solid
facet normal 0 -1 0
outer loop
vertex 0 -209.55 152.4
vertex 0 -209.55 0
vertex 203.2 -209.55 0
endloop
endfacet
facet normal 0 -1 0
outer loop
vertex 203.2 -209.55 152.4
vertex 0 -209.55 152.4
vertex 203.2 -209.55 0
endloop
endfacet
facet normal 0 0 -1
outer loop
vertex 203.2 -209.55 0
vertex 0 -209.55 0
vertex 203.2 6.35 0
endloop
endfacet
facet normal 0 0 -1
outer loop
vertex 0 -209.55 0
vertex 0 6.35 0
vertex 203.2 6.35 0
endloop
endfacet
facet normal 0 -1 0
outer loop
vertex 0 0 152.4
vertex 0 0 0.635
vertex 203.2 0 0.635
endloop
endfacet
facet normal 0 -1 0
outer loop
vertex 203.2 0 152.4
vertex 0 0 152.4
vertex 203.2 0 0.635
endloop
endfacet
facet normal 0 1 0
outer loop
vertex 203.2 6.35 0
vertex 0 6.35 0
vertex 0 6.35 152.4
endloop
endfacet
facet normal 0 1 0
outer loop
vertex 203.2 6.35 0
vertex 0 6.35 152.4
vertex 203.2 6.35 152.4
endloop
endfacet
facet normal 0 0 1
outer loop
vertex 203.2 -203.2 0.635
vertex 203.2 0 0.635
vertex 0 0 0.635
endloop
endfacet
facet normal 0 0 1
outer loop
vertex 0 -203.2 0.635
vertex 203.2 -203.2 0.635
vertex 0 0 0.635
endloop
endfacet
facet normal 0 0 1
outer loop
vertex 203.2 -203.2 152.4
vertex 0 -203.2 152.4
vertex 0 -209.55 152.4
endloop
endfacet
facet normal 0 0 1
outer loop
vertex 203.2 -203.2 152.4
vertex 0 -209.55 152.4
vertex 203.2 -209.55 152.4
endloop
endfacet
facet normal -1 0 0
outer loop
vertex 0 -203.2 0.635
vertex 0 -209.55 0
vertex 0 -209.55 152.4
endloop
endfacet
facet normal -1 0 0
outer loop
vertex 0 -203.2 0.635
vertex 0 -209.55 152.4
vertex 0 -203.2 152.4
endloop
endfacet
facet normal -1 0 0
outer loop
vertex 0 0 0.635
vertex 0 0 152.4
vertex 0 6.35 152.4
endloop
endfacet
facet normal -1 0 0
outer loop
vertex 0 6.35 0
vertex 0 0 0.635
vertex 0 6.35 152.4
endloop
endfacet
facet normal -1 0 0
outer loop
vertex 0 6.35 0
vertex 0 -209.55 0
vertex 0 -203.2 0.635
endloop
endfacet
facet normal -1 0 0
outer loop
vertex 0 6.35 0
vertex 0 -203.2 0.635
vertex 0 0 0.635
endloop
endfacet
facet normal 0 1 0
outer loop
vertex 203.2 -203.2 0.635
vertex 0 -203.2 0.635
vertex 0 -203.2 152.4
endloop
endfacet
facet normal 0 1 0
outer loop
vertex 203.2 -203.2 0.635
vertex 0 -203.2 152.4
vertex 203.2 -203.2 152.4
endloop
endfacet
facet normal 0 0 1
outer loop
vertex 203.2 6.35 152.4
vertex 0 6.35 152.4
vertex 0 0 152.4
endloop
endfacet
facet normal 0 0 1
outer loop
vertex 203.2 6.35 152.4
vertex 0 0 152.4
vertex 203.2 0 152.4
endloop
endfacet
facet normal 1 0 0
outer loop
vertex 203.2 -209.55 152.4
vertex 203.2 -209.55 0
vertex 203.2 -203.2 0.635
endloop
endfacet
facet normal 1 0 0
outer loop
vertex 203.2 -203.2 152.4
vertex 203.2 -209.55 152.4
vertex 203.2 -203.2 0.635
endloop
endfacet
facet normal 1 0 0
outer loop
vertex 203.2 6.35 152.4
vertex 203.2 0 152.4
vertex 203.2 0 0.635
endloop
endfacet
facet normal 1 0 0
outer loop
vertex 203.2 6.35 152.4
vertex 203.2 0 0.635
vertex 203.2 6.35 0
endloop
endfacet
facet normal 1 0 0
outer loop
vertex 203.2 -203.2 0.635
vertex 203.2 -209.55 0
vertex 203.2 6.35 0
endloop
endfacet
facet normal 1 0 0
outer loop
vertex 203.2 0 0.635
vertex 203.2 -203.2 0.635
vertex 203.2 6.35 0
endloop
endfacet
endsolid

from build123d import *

# Parameters (mm, degrees)
SKETCH1_W             = 203.2
SKETCH1_H             = 6.35
BOSS_EXTRUDE1_DEPTH   = 152.4
BOSS_EXTRUDE1_2_DEPTH = 152.4
SKETCH3_W             = 203.2
SKETCH3_H             = 215.9
BOSS_EXTRUDE2_DEPTH   = 0.635


with BuildPart() as part:
    # Sketch1 → Boss-Extrude1 (new body)
    with BuildSketch(Plane.XY):
        with Locations((101.6, 3.175)):
            Rectangle(SKETCH1_W, SKETCH1_H)
    extrude(amount=BOSS_EXTRUDE1_DEPTH)



with BuildPart() as body_2:
    # Sketch1 → Boss-Extrude1 2 (new body)
    with BuildSketch(Plane.XY):
        with Locations((101.6, -206.375)):
            Rectangle(SKETCH1_W, SKETCH1_H)
    extrude(amount=BOSS_EXTRUDE1_2_DEPTH)


with BuildPart() as part_1:
    add(part.part)

    add(body_2.part)  # Boss-Extrude2 merges body 2
    # Sketch3 → Boss-Extrude2 (add)
    with BuildSketch(Plane(origin=(0, 0, 0), x_dir=(-1, 0, 0), z_dir=(0, 0, -1))):
        with Locations((-101.6, -101.6)):
            Rectangle(SKETCH3_W, SKETCH3_H)
    extrude(amount=-BOSS_EXTRUDE2_DEPTH)


solid = part_1.part
